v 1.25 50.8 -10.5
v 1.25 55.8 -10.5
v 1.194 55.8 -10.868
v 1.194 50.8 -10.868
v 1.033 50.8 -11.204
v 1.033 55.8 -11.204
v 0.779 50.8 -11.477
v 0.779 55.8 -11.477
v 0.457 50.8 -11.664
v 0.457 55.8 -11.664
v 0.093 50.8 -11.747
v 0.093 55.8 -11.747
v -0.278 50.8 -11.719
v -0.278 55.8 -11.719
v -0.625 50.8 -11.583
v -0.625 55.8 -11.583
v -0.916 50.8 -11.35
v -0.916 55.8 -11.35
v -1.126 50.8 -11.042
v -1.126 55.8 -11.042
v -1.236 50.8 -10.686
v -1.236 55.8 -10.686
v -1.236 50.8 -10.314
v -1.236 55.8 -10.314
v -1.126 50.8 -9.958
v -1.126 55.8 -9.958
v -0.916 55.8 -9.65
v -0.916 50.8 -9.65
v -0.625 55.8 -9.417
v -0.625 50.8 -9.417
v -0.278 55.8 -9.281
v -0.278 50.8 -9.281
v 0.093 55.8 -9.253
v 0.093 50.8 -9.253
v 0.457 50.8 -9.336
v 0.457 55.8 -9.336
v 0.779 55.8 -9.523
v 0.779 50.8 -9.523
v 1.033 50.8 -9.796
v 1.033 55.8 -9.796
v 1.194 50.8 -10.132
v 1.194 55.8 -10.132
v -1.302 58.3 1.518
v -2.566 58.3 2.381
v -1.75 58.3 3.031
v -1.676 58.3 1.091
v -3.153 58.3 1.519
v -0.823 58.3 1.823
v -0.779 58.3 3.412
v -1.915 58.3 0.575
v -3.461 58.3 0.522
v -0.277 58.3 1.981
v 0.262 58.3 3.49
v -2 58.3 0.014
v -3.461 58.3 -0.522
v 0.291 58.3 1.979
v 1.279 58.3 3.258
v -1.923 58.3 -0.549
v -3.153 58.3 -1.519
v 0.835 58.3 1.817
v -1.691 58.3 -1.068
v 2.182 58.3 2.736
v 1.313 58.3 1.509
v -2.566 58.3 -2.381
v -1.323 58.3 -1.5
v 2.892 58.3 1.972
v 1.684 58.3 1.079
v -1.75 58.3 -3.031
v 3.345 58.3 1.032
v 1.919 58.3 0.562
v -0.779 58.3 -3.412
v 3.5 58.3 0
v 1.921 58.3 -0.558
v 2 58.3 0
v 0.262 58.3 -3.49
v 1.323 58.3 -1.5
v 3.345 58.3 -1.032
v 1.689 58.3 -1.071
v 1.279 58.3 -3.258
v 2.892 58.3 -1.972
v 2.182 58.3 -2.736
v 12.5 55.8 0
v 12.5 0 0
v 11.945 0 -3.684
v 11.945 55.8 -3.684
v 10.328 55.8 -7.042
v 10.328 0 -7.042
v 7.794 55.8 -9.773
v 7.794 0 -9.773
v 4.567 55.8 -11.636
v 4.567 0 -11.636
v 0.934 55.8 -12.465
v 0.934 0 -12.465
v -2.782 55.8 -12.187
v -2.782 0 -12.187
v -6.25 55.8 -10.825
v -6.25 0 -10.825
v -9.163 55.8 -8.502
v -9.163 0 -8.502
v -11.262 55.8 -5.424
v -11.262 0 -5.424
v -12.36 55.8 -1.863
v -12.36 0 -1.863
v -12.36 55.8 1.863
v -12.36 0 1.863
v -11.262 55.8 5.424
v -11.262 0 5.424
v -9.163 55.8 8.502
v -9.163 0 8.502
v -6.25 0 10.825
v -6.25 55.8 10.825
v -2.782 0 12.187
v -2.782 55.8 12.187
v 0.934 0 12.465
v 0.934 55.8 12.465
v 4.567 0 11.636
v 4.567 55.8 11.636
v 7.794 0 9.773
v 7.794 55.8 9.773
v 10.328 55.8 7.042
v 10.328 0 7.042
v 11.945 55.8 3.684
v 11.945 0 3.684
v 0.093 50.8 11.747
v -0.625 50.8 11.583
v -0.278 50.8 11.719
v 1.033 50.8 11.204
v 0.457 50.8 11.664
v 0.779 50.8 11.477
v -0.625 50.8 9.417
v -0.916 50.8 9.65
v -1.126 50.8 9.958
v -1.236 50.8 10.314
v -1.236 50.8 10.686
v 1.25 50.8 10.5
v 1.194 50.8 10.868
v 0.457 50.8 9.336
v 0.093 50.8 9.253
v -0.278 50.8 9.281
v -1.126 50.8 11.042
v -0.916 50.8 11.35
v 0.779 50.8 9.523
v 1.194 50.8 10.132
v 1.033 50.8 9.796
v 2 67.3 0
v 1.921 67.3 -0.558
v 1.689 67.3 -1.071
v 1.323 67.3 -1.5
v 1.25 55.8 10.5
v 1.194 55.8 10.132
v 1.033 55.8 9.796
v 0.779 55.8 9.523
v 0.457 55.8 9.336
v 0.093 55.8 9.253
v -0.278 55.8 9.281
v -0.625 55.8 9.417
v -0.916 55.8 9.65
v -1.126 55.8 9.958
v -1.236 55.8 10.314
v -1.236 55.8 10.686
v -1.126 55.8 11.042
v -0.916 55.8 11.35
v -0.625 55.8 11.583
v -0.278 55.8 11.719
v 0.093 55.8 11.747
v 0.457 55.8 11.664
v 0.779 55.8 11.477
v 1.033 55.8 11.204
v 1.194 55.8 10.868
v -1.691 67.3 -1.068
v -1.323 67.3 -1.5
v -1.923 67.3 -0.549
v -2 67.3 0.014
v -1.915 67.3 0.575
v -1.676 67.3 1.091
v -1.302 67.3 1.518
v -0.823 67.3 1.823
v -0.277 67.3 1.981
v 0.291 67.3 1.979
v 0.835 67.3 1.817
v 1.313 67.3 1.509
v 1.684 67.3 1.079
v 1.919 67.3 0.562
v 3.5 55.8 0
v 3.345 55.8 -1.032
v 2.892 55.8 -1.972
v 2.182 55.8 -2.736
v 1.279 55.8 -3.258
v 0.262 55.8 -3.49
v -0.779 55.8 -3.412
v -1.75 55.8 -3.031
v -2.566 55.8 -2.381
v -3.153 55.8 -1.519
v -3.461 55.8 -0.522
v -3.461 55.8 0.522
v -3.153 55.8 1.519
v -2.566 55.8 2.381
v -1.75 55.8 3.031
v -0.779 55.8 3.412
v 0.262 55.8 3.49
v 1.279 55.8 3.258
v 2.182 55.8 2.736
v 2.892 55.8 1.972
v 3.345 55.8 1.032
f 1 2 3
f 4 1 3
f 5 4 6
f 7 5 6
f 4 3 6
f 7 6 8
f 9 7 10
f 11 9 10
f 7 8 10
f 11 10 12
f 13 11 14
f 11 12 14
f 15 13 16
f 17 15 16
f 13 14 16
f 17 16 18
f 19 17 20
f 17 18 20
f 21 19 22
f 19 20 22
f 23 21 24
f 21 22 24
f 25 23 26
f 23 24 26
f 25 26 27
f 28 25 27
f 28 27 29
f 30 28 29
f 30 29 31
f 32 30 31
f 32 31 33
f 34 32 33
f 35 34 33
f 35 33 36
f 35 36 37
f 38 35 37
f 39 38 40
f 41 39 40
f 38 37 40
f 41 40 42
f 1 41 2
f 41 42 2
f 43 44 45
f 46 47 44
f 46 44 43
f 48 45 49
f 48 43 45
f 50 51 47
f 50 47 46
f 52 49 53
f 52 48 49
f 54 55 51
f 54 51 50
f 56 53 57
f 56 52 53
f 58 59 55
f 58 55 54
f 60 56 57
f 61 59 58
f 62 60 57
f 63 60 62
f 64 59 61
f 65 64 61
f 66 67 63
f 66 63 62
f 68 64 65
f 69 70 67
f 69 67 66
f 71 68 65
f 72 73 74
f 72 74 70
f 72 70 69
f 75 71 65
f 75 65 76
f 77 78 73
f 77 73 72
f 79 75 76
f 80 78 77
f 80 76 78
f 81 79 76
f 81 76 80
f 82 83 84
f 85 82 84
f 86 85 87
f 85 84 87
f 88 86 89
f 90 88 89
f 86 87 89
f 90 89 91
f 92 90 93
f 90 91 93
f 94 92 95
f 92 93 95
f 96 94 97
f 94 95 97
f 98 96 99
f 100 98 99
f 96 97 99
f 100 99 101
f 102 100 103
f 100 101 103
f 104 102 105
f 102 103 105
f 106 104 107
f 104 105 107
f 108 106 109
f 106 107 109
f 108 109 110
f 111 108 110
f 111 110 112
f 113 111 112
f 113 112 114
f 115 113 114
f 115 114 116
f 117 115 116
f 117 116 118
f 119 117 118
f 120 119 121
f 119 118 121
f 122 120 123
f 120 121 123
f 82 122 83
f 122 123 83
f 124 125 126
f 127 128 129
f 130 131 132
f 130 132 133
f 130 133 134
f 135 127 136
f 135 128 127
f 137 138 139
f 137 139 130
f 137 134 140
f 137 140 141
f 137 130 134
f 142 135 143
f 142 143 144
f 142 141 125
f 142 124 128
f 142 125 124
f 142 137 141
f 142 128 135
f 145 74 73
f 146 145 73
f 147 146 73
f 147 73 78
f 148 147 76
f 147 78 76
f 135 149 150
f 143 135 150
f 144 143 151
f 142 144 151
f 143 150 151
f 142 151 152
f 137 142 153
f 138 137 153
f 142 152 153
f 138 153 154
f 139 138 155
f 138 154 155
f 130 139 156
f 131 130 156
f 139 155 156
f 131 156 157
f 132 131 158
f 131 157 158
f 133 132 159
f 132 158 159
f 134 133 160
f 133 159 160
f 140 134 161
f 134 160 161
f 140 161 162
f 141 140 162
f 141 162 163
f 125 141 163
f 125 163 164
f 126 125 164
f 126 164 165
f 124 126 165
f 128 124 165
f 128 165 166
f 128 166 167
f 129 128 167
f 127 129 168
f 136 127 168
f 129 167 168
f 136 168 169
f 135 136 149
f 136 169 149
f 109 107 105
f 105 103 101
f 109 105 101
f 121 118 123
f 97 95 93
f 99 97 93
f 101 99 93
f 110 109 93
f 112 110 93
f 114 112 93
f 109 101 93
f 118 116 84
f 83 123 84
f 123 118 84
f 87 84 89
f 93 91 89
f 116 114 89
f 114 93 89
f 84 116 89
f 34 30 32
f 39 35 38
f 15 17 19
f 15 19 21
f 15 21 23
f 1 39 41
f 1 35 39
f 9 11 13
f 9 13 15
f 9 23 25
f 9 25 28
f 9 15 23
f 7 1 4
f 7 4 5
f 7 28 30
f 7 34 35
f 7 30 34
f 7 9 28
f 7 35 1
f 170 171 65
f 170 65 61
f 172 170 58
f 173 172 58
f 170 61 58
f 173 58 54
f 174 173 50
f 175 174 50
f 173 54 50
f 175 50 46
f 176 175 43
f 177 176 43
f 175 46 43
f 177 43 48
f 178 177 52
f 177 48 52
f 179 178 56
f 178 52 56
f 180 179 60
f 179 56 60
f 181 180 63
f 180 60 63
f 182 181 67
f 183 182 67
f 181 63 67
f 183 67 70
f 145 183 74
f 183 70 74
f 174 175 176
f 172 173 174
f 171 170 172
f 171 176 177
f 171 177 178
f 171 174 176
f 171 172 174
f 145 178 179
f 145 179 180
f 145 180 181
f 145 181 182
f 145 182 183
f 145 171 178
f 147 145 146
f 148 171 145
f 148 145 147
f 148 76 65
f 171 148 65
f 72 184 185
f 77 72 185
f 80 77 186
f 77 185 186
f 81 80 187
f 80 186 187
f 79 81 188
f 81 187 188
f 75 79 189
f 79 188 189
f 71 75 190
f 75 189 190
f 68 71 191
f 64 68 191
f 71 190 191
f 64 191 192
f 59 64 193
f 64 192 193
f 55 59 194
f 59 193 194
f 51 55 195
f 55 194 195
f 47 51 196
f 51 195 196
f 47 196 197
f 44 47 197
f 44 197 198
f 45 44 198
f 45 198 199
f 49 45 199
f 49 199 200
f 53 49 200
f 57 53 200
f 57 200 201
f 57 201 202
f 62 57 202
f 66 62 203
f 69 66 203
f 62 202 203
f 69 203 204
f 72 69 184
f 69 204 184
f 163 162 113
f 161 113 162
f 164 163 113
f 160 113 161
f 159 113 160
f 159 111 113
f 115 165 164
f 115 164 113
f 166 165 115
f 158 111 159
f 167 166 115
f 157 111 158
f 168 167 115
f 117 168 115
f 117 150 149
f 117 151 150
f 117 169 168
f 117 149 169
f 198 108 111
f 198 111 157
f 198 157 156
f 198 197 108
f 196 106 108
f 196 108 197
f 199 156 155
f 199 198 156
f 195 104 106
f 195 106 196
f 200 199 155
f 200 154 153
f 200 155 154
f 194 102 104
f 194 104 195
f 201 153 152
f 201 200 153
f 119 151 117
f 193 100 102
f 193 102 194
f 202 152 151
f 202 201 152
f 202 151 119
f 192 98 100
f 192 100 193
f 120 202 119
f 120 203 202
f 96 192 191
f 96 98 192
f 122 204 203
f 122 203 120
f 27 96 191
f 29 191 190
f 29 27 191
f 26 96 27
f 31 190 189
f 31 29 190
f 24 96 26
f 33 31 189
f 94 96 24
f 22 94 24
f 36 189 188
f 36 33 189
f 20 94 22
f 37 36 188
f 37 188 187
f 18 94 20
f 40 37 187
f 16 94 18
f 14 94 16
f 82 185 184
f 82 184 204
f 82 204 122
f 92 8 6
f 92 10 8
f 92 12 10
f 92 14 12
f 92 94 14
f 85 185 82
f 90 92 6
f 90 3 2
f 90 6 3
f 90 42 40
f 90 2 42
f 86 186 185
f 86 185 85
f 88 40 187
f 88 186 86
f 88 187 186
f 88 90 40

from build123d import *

# Parameters (mm, degrees)
SKETCH1_R           = 12.5
BOSS_EXTRUDE1_DEPTH = 55.8
SKETCH2_R           = 1.25
CUT_EXTRUDE1_DEPTH  = 5
SKETCH2_3_R         = 3.5
BOSS_EXTRUDE2_DEPTH = 2.5
BOSS_EXTRUDE3_DEPTH = 9


with BuildPart() as part:
    # Sketch1 → Boss-Extrude1 (new body)
    with BuildSketch(Plane(origin=(0, 0, 0), x_dir=(1, 0, 0), z_dir=(0, 1, 0))):
        Circle(SKETCH1_R)
    extrude(amount=BOSS_EXTRUDE1_DEPTH)

    # Sketch2 → Cut-Extrude1 (cut)
    with BuildSketch(Plane(origin=(0, 55.8, 0), x_dir=(1, 0, 0), z_dir=(0, 1, 0))):
        with Locations((0, 10.5)):
            Circle(SKETCH2_R)
        with Locations((0, -10.5)):
            Circle(SKETCH2_R)
    extrude(amount=-CUT_EXTRUDE1_DEPTH, mode=Mode.SUBTRACT)

    # Sketch2<3> → Boss-Extrude2 (add)
    with BuildSketch(Plane(origin=(0, 55.8, 0), x_dir=(1, 0, 0), z_dir=(0, 1, 0))):
        Circle(SKETCH2_3_R)
    extrude(amount=BOSS_EXTRUDE2_DEPTH)

    # Sketch3 → Boss-Extrude3 (add)
    with BuildSketch(Plane(origin=(0, 58.3, 0), x_dir=(1, 0, 0), z_dir=(0, 1, 0))):
        with BuildLine():
            Line((1.322875656, 1.5), (-1.322875656, 1.5))
            ThreePointArc((-1.322875656, 1.5), (-0.822875656, -1.822875656), (2, 0))
            ThreePointArc((2, 0), (1.822875656, 0.822875656), (1.322875656, 1.5))
        make_face()
    extrude(amount=BOSS_EXTRUDE3_DEPTH)


solid = part.part
